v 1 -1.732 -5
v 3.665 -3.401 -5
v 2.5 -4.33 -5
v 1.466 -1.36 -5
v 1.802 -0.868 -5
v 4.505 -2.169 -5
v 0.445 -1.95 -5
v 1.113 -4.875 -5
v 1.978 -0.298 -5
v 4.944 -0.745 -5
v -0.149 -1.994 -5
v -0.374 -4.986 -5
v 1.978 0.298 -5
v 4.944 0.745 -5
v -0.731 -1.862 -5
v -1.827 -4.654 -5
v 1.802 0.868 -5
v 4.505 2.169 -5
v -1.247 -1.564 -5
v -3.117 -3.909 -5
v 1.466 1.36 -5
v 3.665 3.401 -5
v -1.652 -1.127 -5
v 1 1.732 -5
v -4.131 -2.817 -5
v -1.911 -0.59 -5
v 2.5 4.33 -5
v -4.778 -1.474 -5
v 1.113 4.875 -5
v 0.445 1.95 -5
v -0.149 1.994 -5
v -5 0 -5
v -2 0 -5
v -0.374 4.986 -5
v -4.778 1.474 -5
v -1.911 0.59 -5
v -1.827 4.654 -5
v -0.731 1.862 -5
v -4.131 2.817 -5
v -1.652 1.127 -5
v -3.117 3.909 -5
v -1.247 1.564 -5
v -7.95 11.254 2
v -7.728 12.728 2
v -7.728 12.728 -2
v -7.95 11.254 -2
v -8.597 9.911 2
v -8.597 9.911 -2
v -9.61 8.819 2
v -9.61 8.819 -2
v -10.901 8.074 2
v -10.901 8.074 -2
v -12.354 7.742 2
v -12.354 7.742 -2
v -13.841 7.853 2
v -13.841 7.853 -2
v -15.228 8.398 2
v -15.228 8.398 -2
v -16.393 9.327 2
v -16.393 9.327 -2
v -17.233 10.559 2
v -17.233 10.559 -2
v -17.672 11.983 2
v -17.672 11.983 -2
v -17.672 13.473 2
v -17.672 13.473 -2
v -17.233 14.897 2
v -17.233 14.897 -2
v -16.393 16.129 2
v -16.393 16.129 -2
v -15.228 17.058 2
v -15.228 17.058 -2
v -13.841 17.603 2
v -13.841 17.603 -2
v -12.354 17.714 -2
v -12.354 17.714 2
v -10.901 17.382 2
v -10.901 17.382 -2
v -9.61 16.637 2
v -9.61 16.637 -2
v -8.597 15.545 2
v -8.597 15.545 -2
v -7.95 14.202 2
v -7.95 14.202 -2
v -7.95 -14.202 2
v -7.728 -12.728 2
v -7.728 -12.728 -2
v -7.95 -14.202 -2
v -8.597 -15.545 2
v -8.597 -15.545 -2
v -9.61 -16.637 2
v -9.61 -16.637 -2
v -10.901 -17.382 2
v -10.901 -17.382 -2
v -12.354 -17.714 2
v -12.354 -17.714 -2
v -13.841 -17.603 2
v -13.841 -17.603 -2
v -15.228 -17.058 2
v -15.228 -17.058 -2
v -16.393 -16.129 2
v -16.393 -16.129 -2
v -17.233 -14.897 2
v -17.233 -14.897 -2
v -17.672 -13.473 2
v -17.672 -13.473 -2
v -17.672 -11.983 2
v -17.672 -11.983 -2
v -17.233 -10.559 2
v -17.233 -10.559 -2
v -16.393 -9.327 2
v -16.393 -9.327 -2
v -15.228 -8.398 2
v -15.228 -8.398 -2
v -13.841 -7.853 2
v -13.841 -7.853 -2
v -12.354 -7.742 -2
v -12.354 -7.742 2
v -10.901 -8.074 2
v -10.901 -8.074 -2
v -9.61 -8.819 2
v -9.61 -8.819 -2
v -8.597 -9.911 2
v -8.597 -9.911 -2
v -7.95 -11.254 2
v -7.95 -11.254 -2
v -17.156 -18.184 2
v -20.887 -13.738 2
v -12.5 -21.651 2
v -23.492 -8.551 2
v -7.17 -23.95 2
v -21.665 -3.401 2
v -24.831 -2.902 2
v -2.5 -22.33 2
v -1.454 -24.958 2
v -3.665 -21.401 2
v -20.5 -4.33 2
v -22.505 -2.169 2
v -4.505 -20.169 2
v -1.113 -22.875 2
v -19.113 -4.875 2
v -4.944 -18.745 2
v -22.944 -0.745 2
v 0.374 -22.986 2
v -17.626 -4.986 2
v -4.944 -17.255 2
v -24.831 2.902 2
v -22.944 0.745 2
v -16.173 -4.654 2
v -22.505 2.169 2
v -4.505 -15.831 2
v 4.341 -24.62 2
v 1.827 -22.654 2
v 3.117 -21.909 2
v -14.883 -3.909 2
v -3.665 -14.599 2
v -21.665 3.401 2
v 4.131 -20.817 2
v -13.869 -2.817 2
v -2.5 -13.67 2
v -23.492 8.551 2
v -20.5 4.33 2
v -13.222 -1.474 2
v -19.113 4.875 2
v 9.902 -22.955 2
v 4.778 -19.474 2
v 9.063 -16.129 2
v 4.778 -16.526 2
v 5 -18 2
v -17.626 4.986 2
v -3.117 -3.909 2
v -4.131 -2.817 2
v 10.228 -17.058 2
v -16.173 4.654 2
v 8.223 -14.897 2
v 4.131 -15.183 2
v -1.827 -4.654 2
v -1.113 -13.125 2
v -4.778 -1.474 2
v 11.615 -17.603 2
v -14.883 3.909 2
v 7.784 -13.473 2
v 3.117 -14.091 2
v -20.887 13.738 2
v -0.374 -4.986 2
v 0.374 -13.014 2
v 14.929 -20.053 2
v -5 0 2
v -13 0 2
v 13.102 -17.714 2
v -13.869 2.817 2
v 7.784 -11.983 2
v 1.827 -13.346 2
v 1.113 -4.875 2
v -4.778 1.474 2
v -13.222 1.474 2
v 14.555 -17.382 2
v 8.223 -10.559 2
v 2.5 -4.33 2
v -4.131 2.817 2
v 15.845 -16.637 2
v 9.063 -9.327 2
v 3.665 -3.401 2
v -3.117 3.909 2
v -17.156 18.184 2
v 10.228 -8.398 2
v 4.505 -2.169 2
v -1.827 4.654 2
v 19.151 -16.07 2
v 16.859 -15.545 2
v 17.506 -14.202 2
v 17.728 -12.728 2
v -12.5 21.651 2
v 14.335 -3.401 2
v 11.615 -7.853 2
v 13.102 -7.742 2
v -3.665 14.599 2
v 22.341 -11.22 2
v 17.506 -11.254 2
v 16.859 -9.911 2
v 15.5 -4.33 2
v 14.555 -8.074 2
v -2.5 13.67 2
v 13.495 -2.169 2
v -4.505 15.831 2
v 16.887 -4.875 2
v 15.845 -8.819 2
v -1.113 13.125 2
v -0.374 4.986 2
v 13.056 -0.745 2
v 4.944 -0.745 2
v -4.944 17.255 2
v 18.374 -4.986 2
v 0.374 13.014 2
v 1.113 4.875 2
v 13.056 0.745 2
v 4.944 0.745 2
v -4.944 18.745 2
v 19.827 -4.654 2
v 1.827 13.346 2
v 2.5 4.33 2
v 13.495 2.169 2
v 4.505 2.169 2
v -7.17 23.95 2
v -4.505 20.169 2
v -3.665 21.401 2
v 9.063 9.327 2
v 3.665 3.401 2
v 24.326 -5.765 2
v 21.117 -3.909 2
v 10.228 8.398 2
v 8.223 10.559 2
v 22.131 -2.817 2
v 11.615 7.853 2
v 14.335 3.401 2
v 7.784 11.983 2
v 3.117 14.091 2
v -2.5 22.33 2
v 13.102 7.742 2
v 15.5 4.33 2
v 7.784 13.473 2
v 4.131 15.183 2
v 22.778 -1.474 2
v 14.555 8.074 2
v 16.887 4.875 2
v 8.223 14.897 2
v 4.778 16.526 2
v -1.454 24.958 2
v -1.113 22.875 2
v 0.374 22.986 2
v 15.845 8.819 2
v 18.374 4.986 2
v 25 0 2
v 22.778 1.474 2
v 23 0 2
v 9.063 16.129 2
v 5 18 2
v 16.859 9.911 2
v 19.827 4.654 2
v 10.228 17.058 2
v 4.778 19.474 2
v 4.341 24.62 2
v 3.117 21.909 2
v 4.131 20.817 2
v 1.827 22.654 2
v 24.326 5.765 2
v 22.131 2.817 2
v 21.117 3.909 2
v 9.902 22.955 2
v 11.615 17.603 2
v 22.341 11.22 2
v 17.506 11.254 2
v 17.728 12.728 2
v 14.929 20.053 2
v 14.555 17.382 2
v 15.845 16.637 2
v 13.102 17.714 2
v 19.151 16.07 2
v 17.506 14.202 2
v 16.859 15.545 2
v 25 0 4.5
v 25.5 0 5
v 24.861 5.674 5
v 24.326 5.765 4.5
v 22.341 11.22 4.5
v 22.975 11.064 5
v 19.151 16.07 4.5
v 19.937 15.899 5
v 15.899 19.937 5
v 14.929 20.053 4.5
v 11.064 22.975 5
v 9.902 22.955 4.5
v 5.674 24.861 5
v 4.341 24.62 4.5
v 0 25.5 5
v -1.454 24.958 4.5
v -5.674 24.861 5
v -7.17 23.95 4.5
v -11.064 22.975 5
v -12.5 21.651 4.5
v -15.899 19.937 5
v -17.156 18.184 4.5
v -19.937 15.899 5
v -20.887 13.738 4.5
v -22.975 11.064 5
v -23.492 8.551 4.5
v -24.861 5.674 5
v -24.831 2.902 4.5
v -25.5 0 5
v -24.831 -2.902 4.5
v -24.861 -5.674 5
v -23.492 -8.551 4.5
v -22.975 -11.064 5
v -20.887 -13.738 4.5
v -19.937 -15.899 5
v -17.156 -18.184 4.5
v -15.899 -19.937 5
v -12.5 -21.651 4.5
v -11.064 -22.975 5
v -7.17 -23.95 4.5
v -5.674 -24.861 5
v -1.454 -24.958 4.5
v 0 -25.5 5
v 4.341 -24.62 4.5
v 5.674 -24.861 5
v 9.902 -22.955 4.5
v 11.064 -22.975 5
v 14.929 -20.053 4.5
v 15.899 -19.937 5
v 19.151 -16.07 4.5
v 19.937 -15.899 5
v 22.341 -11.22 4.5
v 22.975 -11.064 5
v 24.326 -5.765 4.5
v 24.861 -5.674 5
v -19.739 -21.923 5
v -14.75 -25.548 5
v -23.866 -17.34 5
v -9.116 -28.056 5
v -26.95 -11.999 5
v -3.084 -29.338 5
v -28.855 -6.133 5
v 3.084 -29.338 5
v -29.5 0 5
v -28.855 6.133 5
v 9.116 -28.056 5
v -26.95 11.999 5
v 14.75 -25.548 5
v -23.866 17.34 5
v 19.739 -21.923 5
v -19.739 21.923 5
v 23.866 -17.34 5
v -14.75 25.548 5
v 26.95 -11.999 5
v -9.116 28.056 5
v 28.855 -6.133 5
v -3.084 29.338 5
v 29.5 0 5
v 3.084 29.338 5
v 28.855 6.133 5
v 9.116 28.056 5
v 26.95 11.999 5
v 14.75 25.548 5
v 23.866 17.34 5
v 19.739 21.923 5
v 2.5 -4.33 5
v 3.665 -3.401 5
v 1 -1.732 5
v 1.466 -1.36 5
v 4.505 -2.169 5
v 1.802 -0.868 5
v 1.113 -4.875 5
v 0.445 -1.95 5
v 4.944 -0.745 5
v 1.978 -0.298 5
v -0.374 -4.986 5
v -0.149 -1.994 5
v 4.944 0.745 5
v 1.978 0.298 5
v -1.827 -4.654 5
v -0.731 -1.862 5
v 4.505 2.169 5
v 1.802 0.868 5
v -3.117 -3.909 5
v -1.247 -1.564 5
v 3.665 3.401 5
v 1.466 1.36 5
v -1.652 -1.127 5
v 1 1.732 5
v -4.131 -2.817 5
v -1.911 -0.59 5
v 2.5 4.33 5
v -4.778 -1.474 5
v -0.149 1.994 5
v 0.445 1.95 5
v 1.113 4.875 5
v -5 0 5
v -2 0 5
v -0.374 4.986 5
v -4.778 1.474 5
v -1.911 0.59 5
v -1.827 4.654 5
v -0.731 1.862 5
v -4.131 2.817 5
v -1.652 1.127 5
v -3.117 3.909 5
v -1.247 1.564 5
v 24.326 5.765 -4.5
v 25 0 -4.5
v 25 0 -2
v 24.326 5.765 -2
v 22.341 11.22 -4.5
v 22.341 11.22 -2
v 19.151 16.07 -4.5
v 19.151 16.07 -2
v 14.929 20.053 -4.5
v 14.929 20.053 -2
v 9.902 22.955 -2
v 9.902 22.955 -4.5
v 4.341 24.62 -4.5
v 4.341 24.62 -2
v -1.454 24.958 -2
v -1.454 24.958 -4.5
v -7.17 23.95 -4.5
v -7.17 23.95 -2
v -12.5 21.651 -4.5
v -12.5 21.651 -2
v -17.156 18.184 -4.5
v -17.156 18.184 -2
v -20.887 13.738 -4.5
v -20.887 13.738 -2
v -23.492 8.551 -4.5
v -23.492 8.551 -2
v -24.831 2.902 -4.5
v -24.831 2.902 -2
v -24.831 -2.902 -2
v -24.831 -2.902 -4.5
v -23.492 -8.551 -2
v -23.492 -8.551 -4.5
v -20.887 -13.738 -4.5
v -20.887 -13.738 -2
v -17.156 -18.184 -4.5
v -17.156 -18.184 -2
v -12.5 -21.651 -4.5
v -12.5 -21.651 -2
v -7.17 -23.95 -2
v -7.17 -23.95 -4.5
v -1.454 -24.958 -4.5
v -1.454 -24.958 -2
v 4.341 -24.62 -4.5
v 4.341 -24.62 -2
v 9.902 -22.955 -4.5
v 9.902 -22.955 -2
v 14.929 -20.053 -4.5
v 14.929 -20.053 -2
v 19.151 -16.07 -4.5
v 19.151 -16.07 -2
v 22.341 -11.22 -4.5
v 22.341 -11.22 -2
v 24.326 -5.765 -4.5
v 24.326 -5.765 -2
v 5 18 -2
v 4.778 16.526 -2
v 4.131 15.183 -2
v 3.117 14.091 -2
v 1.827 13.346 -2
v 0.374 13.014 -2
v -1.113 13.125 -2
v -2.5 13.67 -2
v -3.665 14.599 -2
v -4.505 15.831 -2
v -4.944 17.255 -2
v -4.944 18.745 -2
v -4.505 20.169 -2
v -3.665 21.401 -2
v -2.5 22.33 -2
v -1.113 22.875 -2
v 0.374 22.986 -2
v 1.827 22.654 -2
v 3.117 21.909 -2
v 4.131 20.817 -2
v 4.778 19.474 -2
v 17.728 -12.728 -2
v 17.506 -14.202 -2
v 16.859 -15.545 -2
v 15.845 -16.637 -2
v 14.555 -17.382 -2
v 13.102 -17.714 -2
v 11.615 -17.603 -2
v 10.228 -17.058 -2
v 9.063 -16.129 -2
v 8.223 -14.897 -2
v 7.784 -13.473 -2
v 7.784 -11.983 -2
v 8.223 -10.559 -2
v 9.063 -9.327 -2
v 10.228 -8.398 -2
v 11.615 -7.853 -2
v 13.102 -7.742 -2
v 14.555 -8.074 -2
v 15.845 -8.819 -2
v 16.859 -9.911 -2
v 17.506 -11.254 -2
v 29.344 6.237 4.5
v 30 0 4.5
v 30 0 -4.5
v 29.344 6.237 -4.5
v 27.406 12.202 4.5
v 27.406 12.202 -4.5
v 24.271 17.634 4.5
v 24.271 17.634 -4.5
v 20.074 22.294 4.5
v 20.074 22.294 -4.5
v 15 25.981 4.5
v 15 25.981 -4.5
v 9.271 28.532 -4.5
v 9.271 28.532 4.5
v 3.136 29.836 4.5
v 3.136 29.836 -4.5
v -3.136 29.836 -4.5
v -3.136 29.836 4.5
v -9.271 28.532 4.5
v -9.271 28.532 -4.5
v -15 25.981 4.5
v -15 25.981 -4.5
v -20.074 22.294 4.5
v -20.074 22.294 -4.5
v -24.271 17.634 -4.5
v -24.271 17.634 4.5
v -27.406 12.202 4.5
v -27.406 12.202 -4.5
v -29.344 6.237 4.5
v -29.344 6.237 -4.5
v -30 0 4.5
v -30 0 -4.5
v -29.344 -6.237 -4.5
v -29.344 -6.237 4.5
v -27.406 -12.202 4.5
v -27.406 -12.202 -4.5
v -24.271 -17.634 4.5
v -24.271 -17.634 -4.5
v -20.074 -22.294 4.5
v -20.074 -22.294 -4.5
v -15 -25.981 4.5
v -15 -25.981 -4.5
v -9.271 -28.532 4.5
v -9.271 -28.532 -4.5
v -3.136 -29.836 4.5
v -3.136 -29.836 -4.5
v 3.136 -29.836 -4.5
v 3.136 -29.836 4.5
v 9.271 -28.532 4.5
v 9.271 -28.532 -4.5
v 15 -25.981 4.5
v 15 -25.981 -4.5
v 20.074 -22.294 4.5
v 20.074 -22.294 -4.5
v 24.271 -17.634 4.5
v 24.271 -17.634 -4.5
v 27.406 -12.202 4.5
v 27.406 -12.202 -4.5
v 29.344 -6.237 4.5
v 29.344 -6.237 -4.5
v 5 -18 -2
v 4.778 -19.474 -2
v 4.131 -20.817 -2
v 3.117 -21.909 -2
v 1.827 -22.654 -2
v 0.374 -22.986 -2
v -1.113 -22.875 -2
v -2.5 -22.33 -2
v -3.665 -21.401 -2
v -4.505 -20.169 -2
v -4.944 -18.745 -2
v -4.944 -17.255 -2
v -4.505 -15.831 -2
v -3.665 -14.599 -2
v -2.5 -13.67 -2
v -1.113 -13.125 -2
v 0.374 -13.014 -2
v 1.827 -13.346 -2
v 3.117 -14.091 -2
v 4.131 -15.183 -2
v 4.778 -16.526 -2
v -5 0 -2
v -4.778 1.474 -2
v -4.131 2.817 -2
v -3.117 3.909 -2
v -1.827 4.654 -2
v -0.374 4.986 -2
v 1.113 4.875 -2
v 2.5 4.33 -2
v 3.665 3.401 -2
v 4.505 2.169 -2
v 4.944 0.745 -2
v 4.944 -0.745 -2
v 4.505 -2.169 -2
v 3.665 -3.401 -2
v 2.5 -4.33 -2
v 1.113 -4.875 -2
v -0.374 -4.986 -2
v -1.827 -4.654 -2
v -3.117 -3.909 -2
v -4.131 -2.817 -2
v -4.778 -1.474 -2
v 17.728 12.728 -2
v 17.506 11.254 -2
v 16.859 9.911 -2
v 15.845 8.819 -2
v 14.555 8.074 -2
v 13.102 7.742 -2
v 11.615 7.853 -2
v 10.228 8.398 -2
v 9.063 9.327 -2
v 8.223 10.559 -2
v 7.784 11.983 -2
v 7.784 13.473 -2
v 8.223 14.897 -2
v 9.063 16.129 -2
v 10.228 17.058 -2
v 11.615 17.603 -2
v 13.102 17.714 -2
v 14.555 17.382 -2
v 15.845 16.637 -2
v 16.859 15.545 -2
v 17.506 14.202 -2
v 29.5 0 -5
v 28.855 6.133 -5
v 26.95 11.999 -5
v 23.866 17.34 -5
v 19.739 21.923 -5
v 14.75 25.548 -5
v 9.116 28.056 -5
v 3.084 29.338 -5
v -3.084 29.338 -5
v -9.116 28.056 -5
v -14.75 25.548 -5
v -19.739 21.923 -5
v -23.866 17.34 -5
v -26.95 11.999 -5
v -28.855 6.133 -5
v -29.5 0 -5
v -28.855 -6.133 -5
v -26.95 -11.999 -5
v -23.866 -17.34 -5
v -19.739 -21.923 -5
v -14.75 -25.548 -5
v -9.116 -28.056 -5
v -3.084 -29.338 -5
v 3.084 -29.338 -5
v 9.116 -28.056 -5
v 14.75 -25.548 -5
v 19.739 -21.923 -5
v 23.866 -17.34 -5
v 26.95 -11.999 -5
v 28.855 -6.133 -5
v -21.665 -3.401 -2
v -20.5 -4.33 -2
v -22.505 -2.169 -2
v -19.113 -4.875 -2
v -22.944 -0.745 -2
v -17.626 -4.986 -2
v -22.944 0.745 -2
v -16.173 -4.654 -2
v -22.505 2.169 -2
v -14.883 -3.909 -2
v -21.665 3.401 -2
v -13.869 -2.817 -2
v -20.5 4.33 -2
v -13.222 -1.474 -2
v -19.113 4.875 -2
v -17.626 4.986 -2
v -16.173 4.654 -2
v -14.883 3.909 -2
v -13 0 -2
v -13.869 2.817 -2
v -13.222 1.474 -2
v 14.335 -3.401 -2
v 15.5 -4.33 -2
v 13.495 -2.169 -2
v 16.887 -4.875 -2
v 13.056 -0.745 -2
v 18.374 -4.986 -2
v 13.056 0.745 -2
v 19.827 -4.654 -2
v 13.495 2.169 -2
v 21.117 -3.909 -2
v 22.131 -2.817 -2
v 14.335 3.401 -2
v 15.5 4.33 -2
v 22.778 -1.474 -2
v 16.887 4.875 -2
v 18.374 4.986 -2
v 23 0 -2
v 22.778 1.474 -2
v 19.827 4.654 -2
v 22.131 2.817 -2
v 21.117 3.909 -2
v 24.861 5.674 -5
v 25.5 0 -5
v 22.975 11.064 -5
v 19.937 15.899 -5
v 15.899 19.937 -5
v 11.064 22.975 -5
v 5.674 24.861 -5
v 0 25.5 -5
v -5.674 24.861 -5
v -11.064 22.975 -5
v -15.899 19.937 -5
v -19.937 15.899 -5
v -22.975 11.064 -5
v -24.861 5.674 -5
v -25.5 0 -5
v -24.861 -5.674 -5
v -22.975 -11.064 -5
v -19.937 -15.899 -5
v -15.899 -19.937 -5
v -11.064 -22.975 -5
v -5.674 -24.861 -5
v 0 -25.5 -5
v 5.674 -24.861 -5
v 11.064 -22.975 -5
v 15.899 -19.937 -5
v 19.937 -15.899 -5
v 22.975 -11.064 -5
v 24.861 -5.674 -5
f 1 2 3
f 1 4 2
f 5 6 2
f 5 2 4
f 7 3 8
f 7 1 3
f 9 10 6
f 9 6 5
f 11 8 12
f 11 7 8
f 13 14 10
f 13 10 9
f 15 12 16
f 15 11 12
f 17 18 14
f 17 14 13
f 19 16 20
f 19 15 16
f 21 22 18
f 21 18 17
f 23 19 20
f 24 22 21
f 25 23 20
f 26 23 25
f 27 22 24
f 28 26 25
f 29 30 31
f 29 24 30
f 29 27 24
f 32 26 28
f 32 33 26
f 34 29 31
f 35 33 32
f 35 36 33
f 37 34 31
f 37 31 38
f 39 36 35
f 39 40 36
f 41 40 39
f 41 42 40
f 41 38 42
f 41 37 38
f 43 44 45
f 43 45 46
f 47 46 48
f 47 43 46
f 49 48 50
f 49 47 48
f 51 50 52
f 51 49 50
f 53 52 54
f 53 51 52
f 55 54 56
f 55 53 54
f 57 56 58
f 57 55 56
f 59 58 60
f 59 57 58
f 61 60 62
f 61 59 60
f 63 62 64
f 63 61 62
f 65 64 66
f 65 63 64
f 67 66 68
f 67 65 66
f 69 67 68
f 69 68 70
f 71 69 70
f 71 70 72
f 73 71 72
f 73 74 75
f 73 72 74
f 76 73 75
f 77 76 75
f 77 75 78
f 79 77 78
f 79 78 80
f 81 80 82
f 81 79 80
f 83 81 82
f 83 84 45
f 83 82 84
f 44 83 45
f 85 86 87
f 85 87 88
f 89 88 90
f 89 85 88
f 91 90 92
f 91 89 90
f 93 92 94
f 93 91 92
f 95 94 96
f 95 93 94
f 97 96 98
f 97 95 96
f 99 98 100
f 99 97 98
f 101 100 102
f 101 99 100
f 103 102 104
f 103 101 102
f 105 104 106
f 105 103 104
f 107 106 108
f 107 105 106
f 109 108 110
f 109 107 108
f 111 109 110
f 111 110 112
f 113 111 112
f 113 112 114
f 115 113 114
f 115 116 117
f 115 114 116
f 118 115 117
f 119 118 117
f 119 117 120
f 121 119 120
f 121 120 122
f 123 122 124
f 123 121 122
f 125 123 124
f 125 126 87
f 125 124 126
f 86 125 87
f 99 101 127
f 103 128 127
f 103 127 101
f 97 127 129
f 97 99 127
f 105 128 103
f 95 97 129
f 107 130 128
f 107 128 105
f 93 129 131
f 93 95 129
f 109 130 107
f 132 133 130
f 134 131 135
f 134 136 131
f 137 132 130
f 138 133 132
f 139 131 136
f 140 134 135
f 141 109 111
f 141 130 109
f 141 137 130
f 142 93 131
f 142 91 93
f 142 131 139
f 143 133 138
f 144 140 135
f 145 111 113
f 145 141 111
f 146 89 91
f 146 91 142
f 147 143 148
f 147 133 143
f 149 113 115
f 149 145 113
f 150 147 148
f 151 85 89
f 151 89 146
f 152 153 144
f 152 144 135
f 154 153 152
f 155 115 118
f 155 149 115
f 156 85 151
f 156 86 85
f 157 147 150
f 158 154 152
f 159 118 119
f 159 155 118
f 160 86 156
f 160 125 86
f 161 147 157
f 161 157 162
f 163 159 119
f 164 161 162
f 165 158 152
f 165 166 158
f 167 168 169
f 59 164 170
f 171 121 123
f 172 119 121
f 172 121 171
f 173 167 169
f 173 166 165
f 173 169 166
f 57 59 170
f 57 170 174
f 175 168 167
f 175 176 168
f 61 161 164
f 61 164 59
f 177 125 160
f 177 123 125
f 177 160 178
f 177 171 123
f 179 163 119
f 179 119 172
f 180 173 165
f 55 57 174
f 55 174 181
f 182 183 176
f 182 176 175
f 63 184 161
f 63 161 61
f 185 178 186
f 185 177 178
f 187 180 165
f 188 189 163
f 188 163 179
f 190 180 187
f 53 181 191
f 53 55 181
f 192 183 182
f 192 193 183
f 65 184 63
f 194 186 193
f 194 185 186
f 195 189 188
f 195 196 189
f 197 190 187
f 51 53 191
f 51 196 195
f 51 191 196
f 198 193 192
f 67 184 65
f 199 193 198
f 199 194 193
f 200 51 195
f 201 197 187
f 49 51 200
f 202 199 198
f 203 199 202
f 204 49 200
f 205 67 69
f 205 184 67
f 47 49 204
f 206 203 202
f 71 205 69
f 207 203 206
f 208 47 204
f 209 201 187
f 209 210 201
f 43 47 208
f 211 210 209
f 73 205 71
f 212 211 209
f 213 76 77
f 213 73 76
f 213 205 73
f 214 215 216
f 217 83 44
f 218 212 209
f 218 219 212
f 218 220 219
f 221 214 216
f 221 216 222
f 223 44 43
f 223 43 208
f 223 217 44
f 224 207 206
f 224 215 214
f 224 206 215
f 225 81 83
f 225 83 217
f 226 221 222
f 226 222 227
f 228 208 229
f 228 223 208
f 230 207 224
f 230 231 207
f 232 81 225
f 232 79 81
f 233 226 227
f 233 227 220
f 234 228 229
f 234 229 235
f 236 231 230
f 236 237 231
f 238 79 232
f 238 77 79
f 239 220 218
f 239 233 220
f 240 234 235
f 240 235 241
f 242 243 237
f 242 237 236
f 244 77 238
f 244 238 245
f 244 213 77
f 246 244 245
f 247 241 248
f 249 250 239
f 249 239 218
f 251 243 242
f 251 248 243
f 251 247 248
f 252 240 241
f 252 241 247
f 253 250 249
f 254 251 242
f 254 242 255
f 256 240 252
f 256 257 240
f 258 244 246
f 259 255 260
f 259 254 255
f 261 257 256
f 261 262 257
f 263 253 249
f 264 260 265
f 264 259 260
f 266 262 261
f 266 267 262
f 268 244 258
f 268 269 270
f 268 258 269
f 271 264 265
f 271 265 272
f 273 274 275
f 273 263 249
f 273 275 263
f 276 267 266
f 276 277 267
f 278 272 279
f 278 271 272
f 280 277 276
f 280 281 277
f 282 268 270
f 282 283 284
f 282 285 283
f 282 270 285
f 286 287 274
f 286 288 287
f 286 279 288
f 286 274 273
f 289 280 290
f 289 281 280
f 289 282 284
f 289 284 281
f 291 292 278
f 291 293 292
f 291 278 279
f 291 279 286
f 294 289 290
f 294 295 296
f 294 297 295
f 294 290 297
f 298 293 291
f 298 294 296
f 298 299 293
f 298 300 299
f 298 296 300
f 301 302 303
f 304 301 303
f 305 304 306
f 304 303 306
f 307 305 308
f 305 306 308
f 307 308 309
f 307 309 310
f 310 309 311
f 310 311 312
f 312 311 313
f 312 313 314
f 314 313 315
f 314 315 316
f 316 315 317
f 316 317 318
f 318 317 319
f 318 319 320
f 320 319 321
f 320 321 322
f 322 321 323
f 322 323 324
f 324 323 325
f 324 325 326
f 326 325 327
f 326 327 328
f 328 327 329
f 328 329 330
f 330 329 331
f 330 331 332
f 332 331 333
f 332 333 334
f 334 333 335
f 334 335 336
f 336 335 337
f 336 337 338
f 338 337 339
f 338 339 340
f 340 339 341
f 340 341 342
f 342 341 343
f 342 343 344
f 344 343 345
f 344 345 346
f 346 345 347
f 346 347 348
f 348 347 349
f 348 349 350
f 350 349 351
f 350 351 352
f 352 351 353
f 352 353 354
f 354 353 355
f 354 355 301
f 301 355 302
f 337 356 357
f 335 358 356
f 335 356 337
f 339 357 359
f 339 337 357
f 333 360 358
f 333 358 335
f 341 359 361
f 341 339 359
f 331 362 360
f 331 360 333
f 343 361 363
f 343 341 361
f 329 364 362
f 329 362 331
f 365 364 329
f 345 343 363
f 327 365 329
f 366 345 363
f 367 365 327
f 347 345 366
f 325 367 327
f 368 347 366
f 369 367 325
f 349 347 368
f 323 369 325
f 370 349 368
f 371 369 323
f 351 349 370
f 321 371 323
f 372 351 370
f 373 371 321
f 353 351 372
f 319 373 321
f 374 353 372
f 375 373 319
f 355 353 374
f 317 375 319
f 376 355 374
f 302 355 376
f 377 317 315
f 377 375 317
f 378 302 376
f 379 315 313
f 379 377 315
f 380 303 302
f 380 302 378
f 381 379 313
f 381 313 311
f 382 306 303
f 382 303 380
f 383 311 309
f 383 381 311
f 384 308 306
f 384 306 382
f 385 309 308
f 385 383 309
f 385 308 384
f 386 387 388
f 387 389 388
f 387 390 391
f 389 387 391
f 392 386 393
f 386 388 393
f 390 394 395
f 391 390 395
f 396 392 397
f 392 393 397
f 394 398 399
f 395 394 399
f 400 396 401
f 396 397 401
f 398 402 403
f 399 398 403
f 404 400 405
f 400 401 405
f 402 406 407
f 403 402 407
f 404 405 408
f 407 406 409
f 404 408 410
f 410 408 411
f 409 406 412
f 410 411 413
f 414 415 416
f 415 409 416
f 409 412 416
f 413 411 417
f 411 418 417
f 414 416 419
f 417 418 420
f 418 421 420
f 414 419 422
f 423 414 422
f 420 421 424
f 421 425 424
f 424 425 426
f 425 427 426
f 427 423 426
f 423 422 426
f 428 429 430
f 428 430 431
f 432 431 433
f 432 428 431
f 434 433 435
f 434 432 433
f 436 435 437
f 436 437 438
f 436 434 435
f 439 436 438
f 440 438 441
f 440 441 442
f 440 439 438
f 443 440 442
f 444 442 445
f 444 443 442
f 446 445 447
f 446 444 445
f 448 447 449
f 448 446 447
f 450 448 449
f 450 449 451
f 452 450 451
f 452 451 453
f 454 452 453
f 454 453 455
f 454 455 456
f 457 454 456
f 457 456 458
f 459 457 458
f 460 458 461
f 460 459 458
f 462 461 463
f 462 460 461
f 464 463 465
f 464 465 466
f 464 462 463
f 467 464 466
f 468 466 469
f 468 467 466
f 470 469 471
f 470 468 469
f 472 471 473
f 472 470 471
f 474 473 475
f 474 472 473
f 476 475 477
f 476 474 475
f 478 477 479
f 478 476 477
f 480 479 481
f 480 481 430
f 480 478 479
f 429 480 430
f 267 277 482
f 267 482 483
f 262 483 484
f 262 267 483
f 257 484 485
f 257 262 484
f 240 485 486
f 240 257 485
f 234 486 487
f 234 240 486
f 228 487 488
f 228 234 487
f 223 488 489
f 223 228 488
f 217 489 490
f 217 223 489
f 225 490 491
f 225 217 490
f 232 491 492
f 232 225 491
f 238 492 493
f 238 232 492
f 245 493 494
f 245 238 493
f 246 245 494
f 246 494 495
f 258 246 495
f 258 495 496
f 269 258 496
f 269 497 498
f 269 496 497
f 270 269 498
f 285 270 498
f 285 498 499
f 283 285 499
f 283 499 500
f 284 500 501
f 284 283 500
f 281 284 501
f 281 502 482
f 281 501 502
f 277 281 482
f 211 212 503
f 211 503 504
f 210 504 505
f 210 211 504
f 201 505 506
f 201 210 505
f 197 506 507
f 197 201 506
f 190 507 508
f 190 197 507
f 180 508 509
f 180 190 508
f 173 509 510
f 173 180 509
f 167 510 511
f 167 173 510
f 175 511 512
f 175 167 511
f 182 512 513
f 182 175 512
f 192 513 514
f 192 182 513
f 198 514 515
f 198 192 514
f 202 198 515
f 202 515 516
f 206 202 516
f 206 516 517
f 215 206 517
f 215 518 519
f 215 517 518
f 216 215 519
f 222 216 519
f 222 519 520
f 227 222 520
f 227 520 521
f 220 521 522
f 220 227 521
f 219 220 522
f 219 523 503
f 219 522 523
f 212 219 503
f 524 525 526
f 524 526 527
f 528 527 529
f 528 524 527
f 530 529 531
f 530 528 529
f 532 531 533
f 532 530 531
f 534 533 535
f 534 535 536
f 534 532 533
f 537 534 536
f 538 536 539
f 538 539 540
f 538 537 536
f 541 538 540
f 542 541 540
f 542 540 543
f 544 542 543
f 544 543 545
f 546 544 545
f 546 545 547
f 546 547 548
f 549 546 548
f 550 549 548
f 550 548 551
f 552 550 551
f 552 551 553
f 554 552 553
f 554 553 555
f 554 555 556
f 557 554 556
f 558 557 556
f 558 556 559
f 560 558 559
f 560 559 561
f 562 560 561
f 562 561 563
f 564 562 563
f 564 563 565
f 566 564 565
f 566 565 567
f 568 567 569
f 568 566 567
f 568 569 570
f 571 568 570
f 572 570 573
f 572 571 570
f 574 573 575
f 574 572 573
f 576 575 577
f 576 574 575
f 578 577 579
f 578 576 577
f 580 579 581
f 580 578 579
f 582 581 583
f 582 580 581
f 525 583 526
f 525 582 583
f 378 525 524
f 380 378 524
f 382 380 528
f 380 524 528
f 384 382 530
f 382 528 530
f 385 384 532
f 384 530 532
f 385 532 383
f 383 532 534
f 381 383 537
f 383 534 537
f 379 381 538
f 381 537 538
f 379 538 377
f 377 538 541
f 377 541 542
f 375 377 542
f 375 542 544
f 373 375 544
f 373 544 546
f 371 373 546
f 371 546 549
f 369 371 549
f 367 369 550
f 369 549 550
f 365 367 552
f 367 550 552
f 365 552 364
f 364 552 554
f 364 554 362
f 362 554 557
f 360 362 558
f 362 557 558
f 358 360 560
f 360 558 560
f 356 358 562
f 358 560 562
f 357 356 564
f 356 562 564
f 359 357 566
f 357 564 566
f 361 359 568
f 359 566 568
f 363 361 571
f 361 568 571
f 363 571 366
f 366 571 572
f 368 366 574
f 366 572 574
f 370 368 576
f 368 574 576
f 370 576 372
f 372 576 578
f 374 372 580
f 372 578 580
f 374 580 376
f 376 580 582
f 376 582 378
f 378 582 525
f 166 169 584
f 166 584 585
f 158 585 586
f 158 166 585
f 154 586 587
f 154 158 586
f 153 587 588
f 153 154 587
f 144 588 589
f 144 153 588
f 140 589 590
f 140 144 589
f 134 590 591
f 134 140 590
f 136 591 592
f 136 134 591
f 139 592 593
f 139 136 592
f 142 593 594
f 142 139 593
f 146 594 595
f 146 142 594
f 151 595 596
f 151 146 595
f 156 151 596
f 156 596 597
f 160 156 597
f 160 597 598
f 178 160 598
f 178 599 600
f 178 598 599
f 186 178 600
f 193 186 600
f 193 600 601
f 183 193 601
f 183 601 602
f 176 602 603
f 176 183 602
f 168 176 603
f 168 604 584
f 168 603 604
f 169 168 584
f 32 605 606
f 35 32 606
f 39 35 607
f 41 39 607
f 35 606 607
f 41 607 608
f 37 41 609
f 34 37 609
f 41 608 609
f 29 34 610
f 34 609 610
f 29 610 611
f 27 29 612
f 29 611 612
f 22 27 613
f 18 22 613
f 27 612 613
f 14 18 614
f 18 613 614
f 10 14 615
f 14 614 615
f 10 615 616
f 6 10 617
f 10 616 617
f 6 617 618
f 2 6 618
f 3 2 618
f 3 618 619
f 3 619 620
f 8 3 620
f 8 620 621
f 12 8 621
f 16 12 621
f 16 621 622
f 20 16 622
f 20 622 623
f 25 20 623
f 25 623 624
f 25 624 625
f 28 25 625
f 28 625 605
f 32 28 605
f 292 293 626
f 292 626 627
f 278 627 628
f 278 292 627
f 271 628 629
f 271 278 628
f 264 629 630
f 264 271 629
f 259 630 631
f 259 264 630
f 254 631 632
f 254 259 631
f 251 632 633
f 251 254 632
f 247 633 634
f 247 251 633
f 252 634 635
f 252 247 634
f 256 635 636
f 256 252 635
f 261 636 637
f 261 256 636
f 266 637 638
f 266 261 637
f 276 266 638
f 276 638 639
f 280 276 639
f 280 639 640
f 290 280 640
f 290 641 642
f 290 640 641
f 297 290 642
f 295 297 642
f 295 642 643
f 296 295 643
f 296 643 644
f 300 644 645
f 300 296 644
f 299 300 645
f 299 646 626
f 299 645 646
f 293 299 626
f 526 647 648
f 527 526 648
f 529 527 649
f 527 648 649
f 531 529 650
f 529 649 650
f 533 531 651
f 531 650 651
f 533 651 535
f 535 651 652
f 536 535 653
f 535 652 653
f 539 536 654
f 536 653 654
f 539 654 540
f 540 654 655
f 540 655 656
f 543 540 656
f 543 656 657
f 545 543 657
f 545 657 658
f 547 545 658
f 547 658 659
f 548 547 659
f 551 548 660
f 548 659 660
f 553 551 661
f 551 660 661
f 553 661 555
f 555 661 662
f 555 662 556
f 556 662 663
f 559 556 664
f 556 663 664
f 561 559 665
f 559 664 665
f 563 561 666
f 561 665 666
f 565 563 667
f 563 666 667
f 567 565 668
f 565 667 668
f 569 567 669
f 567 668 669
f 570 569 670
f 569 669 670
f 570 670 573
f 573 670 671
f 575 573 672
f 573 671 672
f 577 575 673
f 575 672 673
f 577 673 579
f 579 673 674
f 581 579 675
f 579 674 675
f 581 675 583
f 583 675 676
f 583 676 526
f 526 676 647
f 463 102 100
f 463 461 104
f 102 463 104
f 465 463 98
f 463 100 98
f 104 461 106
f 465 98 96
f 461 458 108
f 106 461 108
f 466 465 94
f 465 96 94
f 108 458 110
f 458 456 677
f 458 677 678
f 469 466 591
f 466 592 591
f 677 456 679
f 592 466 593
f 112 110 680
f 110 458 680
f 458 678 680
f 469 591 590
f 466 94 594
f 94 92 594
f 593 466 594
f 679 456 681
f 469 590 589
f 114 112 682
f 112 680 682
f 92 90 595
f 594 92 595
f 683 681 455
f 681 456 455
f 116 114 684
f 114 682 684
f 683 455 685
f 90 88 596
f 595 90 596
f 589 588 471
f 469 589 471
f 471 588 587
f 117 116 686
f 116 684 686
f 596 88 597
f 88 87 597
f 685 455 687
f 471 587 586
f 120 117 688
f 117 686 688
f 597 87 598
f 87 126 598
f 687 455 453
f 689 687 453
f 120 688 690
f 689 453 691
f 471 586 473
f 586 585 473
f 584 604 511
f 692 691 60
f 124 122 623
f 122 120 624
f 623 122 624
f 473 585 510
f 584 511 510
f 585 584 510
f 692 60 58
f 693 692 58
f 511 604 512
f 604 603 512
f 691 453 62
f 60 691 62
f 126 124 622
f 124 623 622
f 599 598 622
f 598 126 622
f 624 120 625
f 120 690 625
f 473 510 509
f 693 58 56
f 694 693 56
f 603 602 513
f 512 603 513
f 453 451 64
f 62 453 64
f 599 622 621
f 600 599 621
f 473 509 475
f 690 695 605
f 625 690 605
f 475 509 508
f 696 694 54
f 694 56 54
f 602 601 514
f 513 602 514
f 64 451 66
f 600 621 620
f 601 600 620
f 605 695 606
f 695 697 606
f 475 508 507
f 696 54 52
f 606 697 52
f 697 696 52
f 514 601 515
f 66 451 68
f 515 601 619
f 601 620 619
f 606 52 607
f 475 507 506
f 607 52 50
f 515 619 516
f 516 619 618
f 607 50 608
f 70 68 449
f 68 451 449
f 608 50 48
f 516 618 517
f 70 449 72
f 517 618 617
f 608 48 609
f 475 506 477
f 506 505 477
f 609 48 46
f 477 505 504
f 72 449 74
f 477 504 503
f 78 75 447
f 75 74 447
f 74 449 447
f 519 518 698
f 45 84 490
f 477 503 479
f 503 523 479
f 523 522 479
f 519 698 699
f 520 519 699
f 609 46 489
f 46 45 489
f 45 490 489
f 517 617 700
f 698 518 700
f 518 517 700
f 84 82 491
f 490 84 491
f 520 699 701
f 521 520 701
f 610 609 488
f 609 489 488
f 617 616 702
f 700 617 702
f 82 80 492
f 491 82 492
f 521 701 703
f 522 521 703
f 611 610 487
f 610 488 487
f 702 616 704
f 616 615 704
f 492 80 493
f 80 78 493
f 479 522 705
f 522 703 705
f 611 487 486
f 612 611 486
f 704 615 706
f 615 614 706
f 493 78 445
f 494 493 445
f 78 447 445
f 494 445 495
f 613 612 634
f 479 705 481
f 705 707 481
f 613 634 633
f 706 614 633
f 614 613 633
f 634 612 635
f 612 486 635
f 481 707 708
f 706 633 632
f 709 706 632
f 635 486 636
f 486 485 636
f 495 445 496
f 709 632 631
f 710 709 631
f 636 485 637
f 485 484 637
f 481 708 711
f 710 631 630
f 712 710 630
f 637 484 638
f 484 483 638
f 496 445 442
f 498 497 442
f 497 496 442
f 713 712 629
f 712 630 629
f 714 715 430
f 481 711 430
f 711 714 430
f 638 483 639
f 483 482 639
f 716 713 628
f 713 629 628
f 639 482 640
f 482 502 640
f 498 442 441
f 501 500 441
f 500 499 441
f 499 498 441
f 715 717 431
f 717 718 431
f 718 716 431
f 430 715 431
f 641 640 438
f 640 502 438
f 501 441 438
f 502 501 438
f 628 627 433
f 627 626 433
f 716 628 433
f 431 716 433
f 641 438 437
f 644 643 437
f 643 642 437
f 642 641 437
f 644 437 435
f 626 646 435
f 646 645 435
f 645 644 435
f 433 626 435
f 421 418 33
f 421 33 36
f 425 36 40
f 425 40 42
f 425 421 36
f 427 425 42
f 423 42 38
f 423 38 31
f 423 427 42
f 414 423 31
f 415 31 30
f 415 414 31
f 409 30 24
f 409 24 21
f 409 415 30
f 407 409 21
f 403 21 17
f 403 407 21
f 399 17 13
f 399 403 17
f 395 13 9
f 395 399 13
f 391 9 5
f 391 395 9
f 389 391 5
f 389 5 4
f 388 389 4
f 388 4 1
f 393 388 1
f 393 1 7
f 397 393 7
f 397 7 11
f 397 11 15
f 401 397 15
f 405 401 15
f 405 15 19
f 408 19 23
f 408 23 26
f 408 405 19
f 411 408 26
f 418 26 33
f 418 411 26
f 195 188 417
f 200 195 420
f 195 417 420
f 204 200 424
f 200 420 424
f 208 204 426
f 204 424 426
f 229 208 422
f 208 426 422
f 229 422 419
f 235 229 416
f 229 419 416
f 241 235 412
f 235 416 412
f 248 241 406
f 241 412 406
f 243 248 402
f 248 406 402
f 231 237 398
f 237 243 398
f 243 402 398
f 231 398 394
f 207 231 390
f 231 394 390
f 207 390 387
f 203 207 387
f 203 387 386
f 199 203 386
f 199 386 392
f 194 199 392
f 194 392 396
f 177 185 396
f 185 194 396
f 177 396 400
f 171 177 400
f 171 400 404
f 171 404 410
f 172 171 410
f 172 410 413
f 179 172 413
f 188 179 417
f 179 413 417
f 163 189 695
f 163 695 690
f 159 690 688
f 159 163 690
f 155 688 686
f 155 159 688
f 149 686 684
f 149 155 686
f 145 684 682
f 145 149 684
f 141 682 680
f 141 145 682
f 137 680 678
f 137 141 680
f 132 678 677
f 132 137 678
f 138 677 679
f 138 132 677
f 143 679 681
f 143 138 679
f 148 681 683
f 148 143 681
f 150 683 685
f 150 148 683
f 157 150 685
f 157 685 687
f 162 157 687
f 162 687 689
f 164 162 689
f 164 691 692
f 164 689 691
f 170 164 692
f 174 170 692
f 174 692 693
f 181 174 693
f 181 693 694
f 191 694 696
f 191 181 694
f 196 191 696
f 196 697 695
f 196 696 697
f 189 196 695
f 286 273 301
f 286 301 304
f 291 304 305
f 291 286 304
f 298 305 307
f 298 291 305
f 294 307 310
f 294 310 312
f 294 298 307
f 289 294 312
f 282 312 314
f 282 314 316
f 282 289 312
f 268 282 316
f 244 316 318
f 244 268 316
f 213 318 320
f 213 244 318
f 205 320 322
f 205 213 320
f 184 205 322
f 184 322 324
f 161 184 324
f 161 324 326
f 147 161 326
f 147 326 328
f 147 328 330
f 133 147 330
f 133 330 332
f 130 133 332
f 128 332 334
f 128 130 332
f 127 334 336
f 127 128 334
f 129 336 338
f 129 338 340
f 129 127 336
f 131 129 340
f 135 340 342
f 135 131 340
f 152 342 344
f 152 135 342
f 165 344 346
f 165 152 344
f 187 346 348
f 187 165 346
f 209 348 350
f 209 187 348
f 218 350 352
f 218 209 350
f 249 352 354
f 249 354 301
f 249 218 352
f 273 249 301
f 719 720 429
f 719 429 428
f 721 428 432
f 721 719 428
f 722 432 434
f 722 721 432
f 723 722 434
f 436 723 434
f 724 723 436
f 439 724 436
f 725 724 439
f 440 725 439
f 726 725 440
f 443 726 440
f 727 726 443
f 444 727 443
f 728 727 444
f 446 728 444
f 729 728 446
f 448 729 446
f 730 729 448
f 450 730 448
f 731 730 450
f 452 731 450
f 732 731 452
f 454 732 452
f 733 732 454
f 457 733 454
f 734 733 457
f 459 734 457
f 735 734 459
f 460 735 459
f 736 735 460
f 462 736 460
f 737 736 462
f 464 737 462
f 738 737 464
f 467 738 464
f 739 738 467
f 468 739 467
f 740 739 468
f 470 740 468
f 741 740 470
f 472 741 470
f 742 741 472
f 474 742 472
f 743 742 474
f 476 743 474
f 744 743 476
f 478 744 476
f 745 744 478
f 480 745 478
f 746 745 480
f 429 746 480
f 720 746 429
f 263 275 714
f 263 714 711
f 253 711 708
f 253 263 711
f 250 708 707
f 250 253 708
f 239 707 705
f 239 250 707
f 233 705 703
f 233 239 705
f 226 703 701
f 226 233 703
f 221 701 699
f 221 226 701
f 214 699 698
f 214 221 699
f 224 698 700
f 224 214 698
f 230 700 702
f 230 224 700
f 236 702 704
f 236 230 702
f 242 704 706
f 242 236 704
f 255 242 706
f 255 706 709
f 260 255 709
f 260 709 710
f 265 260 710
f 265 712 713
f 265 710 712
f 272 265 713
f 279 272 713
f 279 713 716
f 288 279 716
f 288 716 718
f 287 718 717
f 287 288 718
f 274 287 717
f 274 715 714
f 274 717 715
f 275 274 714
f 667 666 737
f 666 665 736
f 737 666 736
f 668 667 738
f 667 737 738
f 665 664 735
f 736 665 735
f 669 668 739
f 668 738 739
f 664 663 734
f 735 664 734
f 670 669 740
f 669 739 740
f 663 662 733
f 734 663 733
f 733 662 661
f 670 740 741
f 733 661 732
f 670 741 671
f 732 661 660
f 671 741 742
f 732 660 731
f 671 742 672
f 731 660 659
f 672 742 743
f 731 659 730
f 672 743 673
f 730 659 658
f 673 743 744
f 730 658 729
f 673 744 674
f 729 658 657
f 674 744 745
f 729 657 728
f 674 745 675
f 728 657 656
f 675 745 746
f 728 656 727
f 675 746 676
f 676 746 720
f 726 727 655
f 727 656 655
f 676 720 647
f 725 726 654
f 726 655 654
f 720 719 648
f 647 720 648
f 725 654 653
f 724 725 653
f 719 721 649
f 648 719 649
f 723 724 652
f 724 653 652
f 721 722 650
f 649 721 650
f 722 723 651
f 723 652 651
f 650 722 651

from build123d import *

# Parameters (mm, degrees)
SKETCH1_R                = 30
SKETCH1_R_2              = 25
BOSS_EXTRUDE1_DEPTH      = 5
SKETCH2_R                = 25
BOSS_EXTRUDE2_DEPTH      = 2
CUT_EXTRUDE1_DEPTH       = 43.720018727
CUT_EXTRUDE1_DEPTH_BACK  = 43.720018727
SKETCH2_4_R              = 5
BOSS_EXTRUDE3_DEPTH      = 3
BOSS_EXTRUDE3_DEPTH_BACK = 7
SKETCH3_R                = 5
SKETCH3_R_2              = 2
CUT_EXTRUDE2_DEPTH       = 44
CUT_EXTRUDE2_DEPTH_BACK  = 44
SKETCH4_R                = 5
CHAMFER1_SIZE            = 0.5


with BuildPart() as part:
    # Sketch1 → Boss-Extrude1 (new, symmetric)
    with BuildSketch(Plane.XY):
        Circle(SKETCH1_R)
        Circle(SKETCH1_R_2, mode=Mode.SUBTRACT)
    extrude(amount=BOSS_EXTRUDE1_DEPTH, both=True)

    # Sketch2 → Boss-Extrude2 (add, symmetric)
    with BuildSketch(Plane.XY):
        Circle(SKETCH2_R)
    extrude(amount=BOSS_EXTRUDE2_DEPTH, both=True)

    # Sketch2<4> → Cut-Extrude1 (cut, two sides: drawn at the far end of the back side and taken through both)
    with BuildSketch(Plane.XY.offset(-CUT_EXTRUDE1_DEPTH_BACK)):
        Circle(SKETCH2_4_R)
    extrude(amount=CUT_EXTRUDE1_DEPTH + CUT_EXTRUDE1_DEPTH_BACK, mode=Mode.SUBTRACT)

    # Sketch3 → Boss-Extrude3 (add, two sides: drawn at the far end of the back side and taken through both)
    with BuildSketch(Plane(origin=(0, 0, -2), x_dir=(-1, 0, 0), z_dir=(0, 0, -1)).offset(-BOSS_EXTRUDE3_DEPTH_BACK)):
        Circle(SKETCH3_R)
        Circle(SKETCH3_R_2, mode=Mode.SUBTRACT)
    extrude(amount=BOSS_EXTRUDE3_DEPTH + BOSS_EXTRUDE3_DEPTH_BACK)

    # Sketch4 → Cut-Extrude2 (cut, two sides: drawn at the far end of the back side and taken through both)
    with BuildSketch(Plane(origin=(0, 0, -2), x_dir=(-1, 0, 0), z_dir=(0, 0, -1)).offset(-CUT_EXTRUDE2_DEPTH_BACK)):
        with Locations((0, 18)):
            Circle(SKETCH4_R)
        with Locations((12.727922061, 12.727922061)):
            Circle(SKETCH4_R)
        with Locations((18, 0)):
            Circle(SKETCH4_R)
        with Locations((12.727922061, -12.727922061)):
            Circle(SKETCH4_R)
        with Locations((0, -18)):
            Circle(SKETCH4_R)
        with Locations((-12.727922061, -12.727922061)):
            Circle(SKETCH4_R)
        with Locations((-18, 0)):
            Circle(SKETCH4_R)
        with Locations((-12.727922061, 12.727922061)):
            Circle(SKETCH4_R)
    extrude(amount=CUT_EXTRUDE2_DEPTH + CUT_EXTRUDE2_DEPTH_BACK, mode=Mode.SUBTRACT)

    # Chamfer1
    chamfer1_edges = [part.edges().sort_by_distance(p)[0] for p in [
        (-25, 0, 5),
        (-30, 0, 5),
        (-25, 0, -5),
        (-30, 0, -5),
    ]]
    chamfer(chamfer1_edges, length=CHAMFER1_SIZE)


solid = part.part
